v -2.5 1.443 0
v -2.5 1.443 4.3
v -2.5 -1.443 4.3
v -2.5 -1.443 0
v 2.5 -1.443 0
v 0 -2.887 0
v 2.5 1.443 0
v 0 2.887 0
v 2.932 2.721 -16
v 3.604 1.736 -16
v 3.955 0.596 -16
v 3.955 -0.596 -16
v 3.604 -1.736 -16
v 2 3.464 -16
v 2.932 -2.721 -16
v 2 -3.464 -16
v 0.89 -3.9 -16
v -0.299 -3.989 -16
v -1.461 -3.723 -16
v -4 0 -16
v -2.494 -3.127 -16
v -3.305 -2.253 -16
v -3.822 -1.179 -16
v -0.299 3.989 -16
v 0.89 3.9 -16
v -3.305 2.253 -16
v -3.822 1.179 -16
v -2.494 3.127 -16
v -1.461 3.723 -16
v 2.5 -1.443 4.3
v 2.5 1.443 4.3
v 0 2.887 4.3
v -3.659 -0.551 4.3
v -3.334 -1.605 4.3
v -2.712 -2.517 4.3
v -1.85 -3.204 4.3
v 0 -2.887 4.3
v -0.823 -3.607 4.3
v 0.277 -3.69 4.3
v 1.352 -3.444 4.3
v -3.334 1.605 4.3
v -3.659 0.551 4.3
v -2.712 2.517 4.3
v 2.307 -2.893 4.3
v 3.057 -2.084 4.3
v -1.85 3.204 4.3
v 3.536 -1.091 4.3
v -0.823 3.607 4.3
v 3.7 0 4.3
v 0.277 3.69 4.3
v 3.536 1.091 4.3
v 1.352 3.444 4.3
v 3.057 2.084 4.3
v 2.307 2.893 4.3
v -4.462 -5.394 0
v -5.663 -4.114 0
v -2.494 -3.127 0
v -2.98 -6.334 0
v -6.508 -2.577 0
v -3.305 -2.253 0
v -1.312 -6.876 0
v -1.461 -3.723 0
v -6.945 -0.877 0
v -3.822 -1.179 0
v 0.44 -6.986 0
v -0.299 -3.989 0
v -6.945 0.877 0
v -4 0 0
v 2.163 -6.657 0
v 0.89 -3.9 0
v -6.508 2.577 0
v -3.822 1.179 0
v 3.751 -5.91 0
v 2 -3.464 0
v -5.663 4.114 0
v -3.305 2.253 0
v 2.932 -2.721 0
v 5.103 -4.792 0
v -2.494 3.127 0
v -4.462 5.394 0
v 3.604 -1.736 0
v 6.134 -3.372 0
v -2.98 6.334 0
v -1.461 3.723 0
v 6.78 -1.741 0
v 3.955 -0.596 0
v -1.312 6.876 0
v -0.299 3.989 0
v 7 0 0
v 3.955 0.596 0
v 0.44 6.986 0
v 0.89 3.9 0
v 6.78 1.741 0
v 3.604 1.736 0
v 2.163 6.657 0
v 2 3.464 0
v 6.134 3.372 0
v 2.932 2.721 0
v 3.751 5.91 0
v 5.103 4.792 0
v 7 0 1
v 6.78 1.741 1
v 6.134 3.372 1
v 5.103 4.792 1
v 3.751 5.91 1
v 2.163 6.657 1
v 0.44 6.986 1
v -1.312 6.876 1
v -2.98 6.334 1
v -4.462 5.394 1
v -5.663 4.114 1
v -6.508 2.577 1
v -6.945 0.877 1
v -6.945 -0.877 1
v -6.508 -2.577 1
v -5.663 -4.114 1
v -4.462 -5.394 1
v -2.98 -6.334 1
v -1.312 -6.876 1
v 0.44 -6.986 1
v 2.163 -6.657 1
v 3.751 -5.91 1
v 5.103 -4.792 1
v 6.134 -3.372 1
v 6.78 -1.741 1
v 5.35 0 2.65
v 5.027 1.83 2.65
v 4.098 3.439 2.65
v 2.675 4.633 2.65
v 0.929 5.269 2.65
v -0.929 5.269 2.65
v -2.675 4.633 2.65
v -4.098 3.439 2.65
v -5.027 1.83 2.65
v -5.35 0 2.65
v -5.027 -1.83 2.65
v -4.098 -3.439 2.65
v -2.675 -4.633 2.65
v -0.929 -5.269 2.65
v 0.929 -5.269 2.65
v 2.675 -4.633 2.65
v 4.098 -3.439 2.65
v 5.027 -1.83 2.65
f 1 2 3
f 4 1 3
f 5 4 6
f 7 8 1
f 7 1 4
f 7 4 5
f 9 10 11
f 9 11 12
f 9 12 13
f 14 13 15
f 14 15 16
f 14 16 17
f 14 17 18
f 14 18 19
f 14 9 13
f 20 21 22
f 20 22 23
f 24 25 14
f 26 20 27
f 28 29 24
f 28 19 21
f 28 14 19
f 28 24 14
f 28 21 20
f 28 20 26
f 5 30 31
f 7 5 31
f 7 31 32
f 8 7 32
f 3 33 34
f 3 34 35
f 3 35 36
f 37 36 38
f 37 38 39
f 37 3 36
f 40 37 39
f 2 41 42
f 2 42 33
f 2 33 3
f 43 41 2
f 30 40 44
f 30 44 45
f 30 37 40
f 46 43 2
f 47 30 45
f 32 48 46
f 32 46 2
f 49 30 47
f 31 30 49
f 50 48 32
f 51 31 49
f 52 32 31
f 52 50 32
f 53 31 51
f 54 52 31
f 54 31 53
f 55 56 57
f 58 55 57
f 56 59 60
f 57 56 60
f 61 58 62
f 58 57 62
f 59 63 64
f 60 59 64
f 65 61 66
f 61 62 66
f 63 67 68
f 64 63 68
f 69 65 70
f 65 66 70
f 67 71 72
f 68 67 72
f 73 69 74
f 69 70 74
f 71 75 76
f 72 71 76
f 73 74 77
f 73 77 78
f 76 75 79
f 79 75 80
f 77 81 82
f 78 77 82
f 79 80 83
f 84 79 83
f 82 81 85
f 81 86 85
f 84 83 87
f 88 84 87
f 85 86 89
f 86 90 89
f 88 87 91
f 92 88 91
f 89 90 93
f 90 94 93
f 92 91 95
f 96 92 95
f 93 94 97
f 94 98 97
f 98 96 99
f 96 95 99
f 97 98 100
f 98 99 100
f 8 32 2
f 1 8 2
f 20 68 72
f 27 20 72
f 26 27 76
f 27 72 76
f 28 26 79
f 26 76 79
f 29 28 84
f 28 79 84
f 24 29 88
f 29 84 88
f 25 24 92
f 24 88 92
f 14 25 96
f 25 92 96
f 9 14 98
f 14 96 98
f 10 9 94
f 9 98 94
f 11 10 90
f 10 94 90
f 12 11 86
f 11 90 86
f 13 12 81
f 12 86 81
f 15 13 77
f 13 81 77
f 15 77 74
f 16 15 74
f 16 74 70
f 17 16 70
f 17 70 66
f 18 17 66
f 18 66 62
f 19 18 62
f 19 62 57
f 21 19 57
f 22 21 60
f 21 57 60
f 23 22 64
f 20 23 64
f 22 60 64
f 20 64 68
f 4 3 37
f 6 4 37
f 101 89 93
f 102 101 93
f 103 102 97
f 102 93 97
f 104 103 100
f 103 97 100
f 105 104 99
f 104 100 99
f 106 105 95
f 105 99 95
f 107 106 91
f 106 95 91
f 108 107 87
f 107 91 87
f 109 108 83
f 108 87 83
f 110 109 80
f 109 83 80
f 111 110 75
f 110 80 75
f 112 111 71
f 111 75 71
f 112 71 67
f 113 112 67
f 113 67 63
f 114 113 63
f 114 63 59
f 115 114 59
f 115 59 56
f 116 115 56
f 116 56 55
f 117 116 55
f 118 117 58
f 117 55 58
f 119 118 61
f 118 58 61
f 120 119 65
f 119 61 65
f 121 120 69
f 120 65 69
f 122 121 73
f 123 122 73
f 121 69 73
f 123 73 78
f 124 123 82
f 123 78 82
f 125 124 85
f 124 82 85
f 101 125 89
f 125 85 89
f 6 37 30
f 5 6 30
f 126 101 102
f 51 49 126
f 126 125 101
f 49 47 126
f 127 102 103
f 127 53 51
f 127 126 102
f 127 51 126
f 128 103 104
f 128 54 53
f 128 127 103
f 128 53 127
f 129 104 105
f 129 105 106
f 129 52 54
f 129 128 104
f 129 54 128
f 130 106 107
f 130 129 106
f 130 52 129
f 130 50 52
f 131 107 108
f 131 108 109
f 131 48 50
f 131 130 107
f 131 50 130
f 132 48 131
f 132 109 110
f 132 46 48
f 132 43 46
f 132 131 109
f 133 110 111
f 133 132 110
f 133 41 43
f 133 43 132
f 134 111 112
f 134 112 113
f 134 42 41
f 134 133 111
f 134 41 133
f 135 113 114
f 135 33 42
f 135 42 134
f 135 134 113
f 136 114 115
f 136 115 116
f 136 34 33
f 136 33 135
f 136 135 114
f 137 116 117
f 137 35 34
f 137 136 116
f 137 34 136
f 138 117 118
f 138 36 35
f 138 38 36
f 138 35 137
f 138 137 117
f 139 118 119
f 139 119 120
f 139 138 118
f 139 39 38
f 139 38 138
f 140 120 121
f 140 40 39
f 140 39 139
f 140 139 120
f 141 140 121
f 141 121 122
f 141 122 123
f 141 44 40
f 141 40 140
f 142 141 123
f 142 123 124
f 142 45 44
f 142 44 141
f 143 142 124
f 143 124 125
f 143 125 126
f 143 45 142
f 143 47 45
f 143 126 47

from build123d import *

# Parameters (mm, degrees)
SKETCH1_R           = 7
BASE_EXTRUDE_DEPTH  = 4.3
SKETCH2_R           = 4
BOSS_EXTRUDE1_DEPTH = 16
CUT_EXTRUDE1_DEPTH  = 4.3
CHAMFER1_SIZE       = 3.3


with BuildPart() as part:
    # Sketch1 → Base-Extrude (new body)
    with BuildSketch(Plane.XY):
        Circle(SKETCH1_R)
    extrude(amount=BASE_EXTRUDE_DEPTH)

    # Sketch2 → Boss-Extrude1 (add)
    with BuildSketch(Plane(origin=(0, 0, 0), x_dir=(-1, 0, 0), z_dir=(0, 0, -1))):
        Circle(SKETCH2_R)
    extrude(amount=BOSS_EXTRUDE1_DEPTH)

    # Sketch3 → Cut-Extrude1 (cut)
    with BuildSketch(Plane.XY.offset(4.3)):
        Polygon((0, 2.886751346), (-2.5, 1.443375673), (-2.5, -1.443375673), (0, -2.886751346), (2.5, -1.443375673), (2.5, 1.443375673), align=None)
    extrude(amount=-CUT_EXTRUDE1_DEPTH, mode=Mode.SUBTRACT)

    # Chamfer1
    chamfer1_edges = [part.edges().sort_by_distance(p)[0] for p in [
        (-7, 0, 4.3),
    ]]
    chamfer(chamfer1_edges, length=CHAMFER1_SIZE)


solid = part.part
